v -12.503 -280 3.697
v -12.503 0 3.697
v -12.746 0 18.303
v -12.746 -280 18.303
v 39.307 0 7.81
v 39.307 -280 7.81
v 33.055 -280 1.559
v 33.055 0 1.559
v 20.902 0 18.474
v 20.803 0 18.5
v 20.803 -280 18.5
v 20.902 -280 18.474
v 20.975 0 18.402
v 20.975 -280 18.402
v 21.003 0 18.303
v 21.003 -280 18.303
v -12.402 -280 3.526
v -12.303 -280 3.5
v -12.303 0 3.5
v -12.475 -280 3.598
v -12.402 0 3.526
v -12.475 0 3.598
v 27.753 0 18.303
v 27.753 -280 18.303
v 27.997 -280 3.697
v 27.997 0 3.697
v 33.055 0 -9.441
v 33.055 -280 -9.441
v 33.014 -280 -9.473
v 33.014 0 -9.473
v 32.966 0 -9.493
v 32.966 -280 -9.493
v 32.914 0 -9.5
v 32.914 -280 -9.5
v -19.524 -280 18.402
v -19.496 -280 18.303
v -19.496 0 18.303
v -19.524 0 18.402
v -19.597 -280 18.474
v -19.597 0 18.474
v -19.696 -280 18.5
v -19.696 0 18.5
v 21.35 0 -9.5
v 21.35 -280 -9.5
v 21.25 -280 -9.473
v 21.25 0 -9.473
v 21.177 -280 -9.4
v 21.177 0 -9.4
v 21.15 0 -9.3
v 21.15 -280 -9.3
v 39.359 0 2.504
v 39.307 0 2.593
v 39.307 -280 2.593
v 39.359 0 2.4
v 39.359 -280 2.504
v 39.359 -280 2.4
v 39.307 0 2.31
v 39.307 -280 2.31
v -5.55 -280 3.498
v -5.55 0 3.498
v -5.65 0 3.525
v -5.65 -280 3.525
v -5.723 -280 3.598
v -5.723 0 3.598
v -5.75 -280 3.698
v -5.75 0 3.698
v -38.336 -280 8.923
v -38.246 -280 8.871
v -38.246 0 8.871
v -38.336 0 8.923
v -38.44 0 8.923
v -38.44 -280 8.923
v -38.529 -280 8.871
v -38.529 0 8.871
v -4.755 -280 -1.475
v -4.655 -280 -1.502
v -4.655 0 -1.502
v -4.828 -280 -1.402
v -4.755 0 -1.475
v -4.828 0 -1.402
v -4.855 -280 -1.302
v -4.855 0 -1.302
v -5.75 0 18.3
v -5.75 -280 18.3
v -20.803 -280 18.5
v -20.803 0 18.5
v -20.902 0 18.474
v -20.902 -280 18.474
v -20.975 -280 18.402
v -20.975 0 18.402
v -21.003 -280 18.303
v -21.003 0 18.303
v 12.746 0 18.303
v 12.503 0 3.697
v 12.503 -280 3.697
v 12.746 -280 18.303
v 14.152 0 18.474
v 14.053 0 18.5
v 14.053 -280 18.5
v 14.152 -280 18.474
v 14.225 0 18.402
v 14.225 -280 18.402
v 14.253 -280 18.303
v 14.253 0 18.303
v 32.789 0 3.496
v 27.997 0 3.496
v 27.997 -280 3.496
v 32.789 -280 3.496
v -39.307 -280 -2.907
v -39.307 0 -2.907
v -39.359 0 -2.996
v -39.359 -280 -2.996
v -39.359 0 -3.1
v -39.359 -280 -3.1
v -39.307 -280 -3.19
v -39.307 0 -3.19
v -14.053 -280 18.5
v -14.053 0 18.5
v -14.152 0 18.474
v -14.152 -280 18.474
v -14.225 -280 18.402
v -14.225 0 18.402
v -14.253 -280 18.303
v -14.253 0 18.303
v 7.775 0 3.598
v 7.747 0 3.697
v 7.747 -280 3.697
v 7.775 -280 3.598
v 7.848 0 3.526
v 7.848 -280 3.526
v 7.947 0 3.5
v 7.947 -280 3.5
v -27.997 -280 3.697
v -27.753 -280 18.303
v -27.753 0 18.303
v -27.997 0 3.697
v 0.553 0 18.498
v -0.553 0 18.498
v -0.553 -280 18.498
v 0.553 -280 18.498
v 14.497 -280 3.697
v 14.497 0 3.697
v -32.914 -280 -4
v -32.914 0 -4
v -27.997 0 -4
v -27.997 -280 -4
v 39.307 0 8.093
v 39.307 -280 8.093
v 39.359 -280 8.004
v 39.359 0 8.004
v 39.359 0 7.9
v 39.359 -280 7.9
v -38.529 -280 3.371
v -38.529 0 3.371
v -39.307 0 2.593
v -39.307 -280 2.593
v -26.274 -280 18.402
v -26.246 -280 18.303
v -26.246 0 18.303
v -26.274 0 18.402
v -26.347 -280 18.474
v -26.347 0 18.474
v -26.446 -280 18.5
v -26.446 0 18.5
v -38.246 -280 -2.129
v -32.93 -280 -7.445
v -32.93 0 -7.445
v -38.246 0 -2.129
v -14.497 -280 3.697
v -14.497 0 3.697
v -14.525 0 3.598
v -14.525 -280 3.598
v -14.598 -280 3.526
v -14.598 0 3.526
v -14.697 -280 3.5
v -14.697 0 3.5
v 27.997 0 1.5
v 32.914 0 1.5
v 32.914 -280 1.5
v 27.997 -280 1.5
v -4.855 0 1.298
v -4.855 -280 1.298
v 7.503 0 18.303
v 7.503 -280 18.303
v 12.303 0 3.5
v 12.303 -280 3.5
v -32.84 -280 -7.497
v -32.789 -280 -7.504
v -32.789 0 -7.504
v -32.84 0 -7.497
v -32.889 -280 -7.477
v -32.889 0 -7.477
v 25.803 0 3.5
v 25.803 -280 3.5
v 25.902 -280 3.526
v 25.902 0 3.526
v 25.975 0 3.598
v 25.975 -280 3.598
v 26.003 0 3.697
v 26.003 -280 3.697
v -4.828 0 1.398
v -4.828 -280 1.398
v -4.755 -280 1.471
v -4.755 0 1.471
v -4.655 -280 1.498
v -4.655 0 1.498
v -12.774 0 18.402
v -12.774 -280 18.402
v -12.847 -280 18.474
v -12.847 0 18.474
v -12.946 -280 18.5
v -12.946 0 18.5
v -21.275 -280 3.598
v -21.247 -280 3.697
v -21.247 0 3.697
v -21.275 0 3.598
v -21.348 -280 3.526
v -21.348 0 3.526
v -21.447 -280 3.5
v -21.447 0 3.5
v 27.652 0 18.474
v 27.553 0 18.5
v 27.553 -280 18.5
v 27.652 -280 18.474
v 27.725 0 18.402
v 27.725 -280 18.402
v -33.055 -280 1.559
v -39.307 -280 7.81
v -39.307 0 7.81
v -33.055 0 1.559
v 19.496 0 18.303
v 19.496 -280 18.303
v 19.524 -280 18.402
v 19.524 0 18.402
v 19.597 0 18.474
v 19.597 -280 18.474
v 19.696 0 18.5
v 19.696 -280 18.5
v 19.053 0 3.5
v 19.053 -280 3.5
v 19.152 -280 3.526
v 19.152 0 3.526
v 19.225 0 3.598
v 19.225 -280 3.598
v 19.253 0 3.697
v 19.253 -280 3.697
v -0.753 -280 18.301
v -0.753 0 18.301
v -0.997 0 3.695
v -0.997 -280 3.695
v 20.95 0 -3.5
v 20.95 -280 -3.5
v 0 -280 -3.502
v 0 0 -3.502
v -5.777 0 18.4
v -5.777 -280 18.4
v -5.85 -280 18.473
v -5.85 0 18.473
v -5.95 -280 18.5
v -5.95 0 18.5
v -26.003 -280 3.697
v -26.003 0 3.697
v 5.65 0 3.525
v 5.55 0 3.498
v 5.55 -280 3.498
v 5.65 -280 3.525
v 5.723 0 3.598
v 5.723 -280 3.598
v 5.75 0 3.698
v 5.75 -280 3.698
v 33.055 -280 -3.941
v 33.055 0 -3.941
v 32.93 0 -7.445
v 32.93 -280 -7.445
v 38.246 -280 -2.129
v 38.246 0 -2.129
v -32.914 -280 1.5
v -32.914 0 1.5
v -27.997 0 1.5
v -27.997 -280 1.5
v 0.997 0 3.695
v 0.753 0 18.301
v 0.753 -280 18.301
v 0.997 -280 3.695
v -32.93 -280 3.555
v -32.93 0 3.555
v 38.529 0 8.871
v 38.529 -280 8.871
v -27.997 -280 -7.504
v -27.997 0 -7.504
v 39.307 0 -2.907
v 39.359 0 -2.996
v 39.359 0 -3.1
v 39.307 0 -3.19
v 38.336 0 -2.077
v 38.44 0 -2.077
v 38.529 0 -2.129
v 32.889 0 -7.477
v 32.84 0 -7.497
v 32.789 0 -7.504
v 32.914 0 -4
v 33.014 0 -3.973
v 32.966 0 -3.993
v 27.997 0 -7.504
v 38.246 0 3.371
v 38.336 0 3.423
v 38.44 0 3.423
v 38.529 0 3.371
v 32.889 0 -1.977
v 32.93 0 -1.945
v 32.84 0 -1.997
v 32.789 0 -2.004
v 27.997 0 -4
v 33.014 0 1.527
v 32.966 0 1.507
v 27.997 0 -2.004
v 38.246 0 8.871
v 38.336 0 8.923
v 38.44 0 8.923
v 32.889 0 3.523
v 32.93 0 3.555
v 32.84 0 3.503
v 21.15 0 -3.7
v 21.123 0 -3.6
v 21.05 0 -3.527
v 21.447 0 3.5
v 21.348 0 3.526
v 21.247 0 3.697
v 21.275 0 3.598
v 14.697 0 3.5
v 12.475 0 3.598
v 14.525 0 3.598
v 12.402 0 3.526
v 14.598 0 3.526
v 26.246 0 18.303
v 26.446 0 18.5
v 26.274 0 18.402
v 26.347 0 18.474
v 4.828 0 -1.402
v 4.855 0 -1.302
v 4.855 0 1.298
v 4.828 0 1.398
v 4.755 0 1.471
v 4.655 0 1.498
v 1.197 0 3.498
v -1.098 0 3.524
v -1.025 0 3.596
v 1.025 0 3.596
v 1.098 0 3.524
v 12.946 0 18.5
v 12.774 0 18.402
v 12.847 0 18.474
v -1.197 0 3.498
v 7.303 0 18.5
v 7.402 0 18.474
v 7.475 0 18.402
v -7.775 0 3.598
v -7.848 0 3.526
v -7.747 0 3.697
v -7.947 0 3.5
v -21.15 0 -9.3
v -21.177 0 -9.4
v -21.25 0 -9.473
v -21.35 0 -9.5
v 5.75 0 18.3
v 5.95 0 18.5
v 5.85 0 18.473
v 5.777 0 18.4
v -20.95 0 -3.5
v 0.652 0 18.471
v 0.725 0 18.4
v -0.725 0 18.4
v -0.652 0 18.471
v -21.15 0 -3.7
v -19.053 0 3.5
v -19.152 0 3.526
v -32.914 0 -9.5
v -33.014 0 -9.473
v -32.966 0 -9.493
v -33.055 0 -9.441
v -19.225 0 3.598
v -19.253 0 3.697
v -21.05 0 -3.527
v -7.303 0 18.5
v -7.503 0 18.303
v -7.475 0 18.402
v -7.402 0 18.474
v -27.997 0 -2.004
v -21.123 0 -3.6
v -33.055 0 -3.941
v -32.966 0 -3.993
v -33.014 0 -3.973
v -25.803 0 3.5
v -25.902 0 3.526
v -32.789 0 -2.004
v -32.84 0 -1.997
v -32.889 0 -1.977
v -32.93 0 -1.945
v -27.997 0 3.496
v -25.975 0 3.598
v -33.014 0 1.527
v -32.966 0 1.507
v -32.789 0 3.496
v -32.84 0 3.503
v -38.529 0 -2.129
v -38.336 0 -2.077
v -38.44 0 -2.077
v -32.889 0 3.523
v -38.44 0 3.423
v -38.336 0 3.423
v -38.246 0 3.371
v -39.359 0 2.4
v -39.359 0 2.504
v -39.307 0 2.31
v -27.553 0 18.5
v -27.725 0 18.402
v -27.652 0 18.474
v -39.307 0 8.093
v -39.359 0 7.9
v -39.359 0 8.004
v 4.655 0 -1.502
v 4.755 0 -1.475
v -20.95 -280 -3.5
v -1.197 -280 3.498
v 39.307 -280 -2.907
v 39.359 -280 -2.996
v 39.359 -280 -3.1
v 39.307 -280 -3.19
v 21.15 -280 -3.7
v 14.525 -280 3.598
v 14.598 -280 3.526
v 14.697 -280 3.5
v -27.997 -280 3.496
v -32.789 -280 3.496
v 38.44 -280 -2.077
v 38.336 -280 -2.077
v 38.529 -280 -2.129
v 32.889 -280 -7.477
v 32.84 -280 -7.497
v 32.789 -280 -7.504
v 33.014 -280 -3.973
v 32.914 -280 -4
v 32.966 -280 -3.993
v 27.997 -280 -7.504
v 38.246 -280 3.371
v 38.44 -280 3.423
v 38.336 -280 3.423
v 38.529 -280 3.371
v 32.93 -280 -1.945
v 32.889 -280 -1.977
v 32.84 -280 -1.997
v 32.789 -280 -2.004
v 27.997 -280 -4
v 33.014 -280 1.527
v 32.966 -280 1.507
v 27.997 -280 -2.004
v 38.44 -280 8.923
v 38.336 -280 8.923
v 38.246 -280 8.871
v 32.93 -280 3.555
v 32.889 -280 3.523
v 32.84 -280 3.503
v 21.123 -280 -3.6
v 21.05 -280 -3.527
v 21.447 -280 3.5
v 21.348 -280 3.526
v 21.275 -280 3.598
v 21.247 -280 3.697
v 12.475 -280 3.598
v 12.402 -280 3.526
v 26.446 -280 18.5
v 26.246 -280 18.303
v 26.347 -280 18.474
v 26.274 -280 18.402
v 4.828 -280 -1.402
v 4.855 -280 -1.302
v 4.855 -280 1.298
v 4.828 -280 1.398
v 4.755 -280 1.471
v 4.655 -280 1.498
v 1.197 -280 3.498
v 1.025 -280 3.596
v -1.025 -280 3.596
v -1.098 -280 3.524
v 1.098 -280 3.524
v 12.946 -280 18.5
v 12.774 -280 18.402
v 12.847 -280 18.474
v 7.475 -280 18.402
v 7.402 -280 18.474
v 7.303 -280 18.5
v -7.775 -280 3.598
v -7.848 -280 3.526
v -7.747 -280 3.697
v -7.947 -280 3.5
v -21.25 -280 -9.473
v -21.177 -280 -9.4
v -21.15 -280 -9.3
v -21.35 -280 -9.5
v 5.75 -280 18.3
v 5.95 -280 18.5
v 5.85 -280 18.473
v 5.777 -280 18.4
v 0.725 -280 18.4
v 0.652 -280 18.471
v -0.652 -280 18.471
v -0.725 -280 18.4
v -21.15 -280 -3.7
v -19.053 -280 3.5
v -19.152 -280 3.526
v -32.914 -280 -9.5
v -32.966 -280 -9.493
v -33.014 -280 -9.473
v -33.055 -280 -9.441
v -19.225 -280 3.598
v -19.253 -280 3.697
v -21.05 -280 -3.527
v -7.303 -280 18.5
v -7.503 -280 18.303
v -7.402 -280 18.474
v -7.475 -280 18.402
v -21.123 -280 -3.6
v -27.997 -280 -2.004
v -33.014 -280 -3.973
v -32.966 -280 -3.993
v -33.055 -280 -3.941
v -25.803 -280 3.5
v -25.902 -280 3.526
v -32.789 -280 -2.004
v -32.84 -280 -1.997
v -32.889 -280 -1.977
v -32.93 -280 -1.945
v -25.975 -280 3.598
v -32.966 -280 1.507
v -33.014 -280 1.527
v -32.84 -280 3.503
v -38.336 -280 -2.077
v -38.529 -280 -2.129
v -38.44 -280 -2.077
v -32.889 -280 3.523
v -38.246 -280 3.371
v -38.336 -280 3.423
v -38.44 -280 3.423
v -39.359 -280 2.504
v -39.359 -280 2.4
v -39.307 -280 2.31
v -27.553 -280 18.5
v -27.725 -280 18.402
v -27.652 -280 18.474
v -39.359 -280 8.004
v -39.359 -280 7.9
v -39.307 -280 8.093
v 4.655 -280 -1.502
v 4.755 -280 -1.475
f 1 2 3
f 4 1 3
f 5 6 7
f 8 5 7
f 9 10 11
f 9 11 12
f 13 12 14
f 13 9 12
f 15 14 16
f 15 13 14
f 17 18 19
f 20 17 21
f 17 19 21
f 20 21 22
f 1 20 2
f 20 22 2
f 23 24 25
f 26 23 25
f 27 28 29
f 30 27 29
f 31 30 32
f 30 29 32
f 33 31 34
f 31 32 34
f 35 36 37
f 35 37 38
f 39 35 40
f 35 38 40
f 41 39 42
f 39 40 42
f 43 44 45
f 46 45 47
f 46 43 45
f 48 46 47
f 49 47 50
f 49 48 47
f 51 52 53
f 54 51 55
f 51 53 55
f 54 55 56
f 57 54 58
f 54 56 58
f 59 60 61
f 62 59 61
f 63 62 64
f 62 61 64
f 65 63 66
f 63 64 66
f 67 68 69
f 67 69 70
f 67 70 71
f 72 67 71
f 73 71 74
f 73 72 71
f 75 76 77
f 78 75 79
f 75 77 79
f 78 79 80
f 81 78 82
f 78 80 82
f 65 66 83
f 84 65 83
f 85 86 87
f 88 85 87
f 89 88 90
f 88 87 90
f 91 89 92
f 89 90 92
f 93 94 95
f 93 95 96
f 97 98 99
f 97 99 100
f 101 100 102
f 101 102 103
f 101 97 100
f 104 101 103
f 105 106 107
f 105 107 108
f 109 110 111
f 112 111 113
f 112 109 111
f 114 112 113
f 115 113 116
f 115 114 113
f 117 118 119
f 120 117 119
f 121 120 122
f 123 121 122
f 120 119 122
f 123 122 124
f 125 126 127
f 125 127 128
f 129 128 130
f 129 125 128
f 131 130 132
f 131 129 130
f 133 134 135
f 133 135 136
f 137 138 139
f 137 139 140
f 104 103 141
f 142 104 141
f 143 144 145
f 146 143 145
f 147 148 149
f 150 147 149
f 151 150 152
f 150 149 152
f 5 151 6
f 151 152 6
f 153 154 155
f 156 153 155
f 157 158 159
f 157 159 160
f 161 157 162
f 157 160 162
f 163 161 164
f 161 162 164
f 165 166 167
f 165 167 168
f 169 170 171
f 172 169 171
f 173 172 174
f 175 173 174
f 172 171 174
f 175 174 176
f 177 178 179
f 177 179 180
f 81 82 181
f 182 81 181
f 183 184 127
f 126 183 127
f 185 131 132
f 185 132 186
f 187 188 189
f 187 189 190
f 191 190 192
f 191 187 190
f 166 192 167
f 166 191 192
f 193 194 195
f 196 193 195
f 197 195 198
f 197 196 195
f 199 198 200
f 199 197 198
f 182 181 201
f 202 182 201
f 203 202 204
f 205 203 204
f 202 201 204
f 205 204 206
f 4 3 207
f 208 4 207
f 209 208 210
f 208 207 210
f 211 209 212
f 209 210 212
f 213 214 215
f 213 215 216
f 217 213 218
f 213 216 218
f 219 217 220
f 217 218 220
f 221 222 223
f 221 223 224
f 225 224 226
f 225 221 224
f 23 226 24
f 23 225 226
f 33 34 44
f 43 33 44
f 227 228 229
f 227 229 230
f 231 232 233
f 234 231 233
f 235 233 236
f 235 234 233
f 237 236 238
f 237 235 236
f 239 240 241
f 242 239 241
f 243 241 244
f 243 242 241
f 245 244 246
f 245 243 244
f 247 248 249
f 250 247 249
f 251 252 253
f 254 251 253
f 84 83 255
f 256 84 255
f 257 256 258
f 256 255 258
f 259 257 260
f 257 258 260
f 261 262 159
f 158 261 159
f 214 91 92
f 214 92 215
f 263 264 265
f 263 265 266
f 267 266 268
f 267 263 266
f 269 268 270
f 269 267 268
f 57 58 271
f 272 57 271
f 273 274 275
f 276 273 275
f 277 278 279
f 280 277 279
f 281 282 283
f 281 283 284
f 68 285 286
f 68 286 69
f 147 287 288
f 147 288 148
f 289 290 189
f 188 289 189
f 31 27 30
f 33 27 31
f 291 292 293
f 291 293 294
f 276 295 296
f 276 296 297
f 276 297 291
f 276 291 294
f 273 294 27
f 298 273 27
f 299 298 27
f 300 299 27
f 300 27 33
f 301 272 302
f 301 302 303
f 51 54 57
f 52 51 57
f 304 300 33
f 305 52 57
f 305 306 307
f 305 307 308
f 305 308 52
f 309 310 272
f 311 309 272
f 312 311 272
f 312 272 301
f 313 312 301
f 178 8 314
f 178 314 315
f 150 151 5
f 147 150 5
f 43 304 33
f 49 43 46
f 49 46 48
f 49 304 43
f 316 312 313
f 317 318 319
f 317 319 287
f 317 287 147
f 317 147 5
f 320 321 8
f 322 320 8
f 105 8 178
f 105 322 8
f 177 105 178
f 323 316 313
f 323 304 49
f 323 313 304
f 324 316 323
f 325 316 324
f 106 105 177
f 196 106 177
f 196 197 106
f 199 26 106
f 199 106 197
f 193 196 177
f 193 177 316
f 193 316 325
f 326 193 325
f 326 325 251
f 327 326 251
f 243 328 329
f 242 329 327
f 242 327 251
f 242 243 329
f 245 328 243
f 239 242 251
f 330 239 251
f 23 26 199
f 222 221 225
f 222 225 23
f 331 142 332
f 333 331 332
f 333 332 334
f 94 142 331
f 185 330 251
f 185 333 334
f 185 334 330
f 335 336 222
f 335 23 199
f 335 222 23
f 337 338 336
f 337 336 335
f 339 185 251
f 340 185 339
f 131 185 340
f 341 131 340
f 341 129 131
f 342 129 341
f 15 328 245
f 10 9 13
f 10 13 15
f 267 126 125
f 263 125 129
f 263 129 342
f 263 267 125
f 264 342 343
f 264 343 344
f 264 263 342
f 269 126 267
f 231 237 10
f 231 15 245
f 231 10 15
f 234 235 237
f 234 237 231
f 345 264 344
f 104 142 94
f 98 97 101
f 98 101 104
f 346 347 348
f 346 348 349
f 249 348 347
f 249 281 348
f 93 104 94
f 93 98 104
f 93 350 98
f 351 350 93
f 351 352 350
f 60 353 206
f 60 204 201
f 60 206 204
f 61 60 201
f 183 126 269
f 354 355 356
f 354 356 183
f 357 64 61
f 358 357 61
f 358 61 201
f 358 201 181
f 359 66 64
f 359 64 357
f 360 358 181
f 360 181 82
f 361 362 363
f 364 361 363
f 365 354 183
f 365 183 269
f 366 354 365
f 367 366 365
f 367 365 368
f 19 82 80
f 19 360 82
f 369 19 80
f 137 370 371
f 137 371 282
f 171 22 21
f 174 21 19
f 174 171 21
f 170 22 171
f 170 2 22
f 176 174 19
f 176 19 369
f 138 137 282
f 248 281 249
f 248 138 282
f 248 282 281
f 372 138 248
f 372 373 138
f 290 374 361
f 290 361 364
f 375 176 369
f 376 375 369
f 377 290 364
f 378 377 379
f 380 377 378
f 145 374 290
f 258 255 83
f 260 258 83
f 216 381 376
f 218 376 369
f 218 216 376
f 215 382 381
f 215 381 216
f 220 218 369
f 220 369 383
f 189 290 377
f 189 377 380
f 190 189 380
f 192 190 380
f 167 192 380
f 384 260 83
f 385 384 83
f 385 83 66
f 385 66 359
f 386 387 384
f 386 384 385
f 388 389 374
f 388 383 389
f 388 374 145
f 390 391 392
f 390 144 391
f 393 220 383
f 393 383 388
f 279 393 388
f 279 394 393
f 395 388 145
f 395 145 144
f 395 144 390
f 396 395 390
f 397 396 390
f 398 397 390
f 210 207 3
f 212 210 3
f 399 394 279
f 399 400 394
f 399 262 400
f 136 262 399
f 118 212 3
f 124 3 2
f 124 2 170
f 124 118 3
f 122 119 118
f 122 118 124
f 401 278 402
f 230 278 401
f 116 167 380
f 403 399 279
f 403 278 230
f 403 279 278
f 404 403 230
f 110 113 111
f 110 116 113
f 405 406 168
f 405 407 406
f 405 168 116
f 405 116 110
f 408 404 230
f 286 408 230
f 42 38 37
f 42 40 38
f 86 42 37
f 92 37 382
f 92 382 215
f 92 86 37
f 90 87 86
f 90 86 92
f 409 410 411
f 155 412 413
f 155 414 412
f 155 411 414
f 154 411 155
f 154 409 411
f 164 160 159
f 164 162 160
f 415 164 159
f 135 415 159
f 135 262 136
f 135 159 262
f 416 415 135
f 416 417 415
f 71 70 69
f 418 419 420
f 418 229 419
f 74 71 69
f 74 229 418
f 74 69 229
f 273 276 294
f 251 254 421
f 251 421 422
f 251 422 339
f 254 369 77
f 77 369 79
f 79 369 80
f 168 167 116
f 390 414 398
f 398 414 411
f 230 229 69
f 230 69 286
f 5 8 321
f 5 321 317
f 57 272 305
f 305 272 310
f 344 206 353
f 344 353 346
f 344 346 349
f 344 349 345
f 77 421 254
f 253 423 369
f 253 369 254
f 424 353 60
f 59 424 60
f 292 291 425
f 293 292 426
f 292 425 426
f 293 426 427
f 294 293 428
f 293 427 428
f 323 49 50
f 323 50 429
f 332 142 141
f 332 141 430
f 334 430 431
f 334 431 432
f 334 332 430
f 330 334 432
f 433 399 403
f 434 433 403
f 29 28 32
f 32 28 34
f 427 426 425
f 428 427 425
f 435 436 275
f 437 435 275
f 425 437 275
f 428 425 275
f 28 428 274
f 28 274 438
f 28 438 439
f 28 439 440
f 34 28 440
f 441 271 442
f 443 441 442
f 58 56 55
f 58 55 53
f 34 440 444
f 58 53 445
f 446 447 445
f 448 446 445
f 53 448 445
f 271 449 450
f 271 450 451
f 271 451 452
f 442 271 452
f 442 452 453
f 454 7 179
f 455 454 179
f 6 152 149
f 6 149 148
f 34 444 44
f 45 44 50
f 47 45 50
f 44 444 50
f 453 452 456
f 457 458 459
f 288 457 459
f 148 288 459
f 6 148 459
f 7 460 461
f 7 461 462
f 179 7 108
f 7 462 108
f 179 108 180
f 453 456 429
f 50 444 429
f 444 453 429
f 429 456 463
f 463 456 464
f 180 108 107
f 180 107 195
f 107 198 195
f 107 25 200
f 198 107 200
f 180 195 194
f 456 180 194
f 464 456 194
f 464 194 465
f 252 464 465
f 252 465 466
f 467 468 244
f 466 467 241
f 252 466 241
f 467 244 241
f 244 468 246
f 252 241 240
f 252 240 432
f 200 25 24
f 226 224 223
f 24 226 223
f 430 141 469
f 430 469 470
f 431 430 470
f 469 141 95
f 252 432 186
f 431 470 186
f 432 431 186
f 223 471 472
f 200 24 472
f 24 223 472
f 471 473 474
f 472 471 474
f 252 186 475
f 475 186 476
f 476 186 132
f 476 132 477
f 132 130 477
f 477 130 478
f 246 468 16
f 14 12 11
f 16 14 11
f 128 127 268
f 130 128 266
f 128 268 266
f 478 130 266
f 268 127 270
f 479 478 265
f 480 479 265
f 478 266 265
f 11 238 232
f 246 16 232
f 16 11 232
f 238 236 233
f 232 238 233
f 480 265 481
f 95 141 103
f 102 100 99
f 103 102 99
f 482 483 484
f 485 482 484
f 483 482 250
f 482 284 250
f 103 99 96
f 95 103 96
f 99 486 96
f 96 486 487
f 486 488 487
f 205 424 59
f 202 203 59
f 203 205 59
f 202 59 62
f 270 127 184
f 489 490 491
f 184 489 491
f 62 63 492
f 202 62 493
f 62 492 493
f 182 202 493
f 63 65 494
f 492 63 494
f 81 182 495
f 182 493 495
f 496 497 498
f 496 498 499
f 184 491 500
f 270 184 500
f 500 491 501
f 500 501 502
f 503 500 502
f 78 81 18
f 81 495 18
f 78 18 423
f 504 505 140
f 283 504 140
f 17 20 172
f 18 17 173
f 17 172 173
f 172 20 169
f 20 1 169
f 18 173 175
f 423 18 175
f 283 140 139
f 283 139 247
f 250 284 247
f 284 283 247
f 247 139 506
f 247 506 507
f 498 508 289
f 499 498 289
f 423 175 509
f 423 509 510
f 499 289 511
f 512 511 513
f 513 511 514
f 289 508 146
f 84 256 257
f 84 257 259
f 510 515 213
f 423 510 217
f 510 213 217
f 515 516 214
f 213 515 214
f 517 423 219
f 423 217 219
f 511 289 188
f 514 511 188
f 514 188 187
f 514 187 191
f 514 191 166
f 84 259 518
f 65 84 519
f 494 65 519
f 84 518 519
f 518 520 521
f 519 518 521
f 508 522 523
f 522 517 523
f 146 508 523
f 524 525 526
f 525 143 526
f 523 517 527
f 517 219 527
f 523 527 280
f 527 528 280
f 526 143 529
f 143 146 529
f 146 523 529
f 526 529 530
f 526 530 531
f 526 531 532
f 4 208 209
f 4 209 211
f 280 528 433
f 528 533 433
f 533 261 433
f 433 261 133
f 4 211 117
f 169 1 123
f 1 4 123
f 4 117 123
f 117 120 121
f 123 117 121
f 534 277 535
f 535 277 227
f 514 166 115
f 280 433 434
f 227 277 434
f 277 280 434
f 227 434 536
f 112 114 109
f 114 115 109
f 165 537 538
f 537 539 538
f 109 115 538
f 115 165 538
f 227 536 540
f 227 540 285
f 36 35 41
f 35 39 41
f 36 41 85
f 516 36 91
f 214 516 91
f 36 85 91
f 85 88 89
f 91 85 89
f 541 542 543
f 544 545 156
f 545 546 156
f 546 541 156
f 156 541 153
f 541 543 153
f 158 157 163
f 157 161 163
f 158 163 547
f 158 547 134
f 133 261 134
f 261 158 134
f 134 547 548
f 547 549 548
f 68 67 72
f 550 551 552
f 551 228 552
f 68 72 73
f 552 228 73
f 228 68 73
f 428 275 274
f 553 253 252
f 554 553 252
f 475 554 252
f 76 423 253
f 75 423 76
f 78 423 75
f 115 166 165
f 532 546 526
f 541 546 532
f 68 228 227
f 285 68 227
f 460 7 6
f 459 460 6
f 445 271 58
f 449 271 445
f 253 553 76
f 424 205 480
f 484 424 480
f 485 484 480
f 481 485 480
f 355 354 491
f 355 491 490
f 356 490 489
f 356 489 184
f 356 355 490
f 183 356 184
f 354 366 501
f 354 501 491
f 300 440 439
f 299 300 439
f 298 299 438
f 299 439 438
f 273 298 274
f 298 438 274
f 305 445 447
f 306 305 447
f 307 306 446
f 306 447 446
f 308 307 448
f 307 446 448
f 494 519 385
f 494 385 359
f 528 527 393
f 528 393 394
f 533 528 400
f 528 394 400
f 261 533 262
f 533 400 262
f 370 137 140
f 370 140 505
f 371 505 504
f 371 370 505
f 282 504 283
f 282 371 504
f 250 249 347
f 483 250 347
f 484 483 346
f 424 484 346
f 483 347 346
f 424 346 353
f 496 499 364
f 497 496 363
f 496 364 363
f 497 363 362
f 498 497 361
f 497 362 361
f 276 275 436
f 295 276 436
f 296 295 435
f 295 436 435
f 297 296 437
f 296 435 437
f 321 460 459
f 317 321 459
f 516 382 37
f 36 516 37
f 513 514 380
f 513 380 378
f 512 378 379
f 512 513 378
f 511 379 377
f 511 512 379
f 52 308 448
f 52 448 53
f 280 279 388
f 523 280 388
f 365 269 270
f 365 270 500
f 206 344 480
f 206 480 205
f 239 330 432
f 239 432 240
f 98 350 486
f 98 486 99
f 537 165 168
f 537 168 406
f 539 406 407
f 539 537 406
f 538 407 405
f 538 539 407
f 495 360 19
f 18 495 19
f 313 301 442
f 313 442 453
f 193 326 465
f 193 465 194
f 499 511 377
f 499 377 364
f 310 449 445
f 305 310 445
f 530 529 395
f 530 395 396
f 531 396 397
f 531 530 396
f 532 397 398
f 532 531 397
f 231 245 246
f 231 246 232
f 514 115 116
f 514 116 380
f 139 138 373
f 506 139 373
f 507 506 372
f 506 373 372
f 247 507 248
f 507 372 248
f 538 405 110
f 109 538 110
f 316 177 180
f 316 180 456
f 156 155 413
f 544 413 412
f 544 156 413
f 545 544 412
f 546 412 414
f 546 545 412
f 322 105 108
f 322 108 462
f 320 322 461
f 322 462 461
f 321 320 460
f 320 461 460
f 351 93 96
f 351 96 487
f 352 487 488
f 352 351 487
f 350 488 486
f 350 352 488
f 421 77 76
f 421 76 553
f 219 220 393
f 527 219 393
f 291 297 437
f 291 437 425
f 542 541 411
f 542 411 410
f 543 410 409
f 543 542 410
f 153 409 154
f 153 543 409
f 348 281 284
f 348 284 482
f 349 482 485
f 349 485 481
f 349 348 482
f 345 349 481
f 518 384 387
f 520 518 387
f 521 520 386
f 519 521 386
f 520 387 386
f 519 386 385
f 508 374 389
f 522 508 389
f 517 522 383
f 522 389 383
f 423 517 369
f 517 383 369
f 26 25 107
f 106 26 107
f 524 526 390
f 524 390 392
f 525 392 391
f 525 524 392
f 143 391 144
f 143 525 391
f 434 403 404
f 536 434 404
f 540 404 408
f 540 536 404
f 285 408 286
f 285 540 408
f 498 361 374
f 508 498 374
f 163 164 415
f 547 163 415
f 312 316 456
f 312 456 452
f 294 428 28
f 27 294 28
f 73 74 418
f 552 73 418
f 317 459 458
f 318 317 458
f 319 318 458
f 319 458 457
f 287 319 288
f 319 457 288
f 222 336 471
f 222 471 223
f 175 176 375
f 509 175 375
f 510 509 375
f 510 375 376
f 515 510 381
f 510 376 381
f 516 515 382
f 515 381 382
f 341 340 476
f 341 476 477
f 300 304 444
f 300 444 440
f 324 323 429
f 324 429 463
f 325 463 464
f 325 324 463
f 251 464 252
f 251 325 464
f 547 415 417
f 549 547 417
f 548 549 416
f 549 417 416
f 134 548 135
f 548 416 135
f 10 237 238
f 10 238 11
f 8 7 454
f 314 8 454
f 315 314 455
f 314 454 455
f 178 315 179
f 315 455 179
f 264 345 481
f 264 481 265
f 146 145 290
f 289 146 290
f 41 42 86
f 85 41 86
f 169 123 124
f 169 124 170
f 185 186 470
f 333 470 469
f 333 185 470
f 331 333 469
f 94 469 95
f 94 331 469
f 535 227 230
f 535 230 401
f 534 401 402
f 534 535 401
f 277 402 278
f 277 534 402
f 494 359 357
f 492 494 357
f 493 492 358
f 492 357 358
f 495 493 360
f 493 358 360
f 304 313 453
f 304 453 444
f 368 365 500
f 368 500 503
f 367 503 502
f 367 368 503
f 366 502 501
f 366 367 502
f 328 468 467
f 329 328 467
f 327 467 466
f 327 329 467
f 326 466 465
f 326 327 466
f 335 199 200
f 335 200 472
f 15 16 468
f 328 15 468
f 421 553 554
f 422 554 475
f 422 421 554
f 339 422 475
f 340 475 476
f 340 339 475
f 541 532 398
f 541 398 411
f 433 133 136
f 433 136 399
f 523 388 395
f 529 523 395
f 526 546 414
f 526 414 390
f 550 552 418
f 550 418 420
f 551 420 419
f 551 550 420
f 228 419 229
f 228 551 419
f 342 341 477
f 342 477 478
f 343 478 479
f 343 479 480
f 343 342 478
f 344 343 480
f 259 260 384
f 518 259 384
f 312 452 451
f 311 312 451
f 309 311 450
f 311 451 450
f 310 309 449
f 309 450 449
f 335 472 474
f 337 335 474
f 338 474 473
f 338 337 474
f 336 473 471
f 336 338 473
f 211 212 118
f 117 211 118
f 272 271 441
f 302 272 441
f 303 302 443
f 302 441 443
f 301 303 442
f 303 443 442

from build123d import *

# Parameters (mm, degrees)
F1_DEPTH = 280
F3_DEPTH = 280


with BuildPart() as f1:
    # F0 (on Front) → F1 (new body)
    with BuildSketch(Plane.XZ):
        with BuildLine():
            Line((-26.003272, 3.696673), (-26.246255, 18.303327))
            ThreePointArc((-26.246255, 18.303327), (-26.305987, 18.442593), (-26.446228, 18.5))
            Line((-26.446228, 18.5), (-27.552839, 18.5))
            ThreePointArc((-27.552839, 18.5), (-27.693074, 18.442597), (-27.752811, 18.303339))
            Line((-27.752811, 18.303339), (-27.996716, 3.696661))
            Line((-27.996716, 3.696661), (-27.996716, -9.5))
            Line((-27.996716, -9.5), (-21.35, -9.5))
            ThreePointArc((-21.35, -9.5), (-21.208579, -9.441421), (-21.15, -9.3))
            Line((-21.15, -9.3), (-21.15, -3.7))
            ThreePointArc((-21.15, -3.7), (-21.091421, -3.558579), (-20.95, -3.5))
            Line((-20.95, -3.5), (0, -3.502103))
            Line((0, -3.502103), (0, -1.502103))
            Line((0, -1.502103), (-4.654982, -1.502103))
            ThreePointArc((-4.654982, -1.502103), (-4.796403, -1.443525), (-4.854982, -1.302103))
            Line((-4.854982, -1.302103), (-4.854982, 1.297897))
            ThreePointArc((-4.854982, 1.297897), (-4.796403, 1.439318), (-4.654982, 1.497897))
            Line((-4.654982, 1.497897), (0, 1.497897))
            Line((0, 1.497897), (0, 18.497629))
            Line((0, 18.497629), (-0.55284, 18.497629))
            ThreePointArc((-0.55284, 18.497629), (-0.693076, 18.440226), (-0.752812, 18.300968))
            Line((-0.752812, 18.300968), (-0.996713, 3.694558))
            ThreePointArc((-0.996713, 3.694558), (-1.056449, 3.5553), (-1.196685, 3.497897))
            Line((-1.196685, 3.497897), (-5.550001, 3.497897))
            ThreePointArc((-5.550001, 3.497897), (-5.691423, 3.556475), (-5.750001, 3.697897))
            Line((-5.750001, 3.697897), (-5.750001, 18.3))
            ThreePointArc((-5.750001, 18.3), (-5.80858, 18.441421), (-5.950001, 18.5))
            Line((-5.950001, 18.5), (-7.302839, 18.5))
            ThreePointArc((-7.302839, 18.5), (-7.443074, 18.442597), (-7.502811, 18.303339))
            Line((-7.502811, 18.303339), (-7.746716, 3.696661))
            ThreePointArc((-7.746716, 3.696661), (-7.806452, 3.557403), (-7.946688, 3.5))
            Line((-7.946688, 3.5), (-12.303299, 3.5))
            ThreePointArc((-12.303299, 3.5), (-12.44354, 3.557407), (-12.503272, 3.696673))
            Line((-12.503272, 3.696673), (-12.746255, 18.303327))
            ThreePointArc((-12.746255, 18.303327), (-12.805987, 18.442593), (-12.946228, 18.5))
            Line((-12.946228, 18.5), (-14.052839, 18.5))
            ThreePointArc((-14.052839, 18.5), (-14.193074, 18.442597), (-14.252811, 18.303339))
            Line((-14.252811, 18.303339), (-14.496716, 3.696661))
            ThreePointArc((-14.496716, 3.696661), (-14.556452, 3.557403), (-14.696688, 3.5))
            Line((-14.696688, 3.5), (-19.053299, 3.5))
            ThreePointArc((-19.053299, 3.5), (-19.19354, 3.557407), (-19.253272, 3.696673))
            Line((-19.253272, 3.696673), (-19.496255, 18.303327))
            ThreePointArc((-19.496255, 18.303327), (-19.555987, 18.442593), (-19.696228, 18.5))
            Line((-19.696228, 18.5), (-20.802839, 18.5))
            ThreePointArc((-20.802839, 18.5), (-20.943074, 18.442597), (-21.002811, 18.303339))
            Line((-21.002811, 18.303339), (-21.246716, 3.696661))
            ThreePointArc((-21.246716, 3.696661), (-21.306452, 3.557403), (-21.446688, 3.5))
            Line((-21.446688, 3.5), (-25.803299, 3.5))
            ThreePointArc((-25.803299, 3.5), (-25.94354, 3.557407), (-26.003272, 3.696673))
        make_face()
    extrude(amount=F1_DEPTH)

    # F2 (on face) → F3 (join)
    with BuildSketch(Plane.XZ.offset(280)):
        with BuildLine():
            Line((-27.996716, -9.5), (-27.996716, -7.503925))
            Line((-27.996716, -7.503925), (-32.788628, -7.503925))
            ThreePointArc((-32.788628, -7.503925), (-32.865164, -7.488701), (-32.930049, -7.445347))
            Line((-32.930049, -7.445347), (-38.24641, -2.128986))
            ThreePointArc((-38.24641, -2.128986), (-38.387831, -2.070407), (-38.529253, -2.128986))
            Line((-38.529253, -2.128986), (-39.30707, -2.906803))
            ThreePointArc((-39.30707, -2.906803), (-39.365649, -3.048225), (-39.30707, -3.189646))
            Line((-39.30707, -3.189646), (-33.055295, -9.441421))
            ThreePointArc((-33.055295, -9.441421), (-32.99041, -9.484776), (-32.913873, -9.5))
            Line((-32.913873, -9.5), (-27.996716, -9.5))
        make_face()
        with BuildLine():
            ThreePointArc((-32.788628, -2.003925), (-32.865164, -1.988701), (-32.930049, -1.945347))
            Line((-32.930049, -1.945347), (-38.24641, 3.371014))
            ThreePointArc((-38.24641, 3.371014), (-38.387831, 3.429593), (-38.529253, 3.371014))
            Line((-38.529253, 3.371014), (-39.30707, 2.593197))
            ThreePointArc((-39.30707, 2.593197), (-39.365649, 2.451775), (-39.30707, 2.310354))
            Line((-39.30707, 2.310354), (-33.055295, -3.941421))
            ThreePointArc((-33.055295, -3.941421), (-32.99041, -3.984776), (-32.913873, -4))
            Line((-32.913873, -4), (-27.996716, -4))
            Line((-27.996716, -4), (-27.996716, -2.003925))
            Line((-27.996716, -2.003925), (-32.788628, -2.003925))
        make_face()
        with BuildLine():
            ThreePointArc((-32.788628, 3.496075), (-32.865164, 3.511299), (-32.930049, 3.554653))
            Line((-32.930049, 3.554653), (-38.24641, 8.871014))
            ThreePointArc((-38.24641, 8.871014), (-38.387831, 8.929593), (-38.529253, 8.871014))
            Line((-38.529253, 8.871014), (-39.30707, 8.093197))
            ThreePointArc((-39.30707, 8.093197), (-39.365649, 7.951775), (-39.30707, 7.810354))
            Line((-39.30707, 7.810354), (-33.055295, 1.558579))
            ThreePointArc((-33.055295, 1.558579), (-32.99041, 1.515224), (-32.913873, 1.5))
            Line((-32.913873, 1.5), (-27.996716, 1.5))
            Line((-27.996716, 1.5), (-27.996716, 3.496075))
            Line((-27.996716, 3.496075), (-32.788628, 3.496075))
        make_face()
    extrude(amount=-F3_DEPTH)

    # F4: F1 across face


with BuildPart() as f1_1:
    add(f1.part)
    add(f1.part.mirror(Plane(origin=(0, -140, 9.997763), x_dir=(0, 1, 0), z_dir=(1, 0, 0))))


solid = f1_1.part
